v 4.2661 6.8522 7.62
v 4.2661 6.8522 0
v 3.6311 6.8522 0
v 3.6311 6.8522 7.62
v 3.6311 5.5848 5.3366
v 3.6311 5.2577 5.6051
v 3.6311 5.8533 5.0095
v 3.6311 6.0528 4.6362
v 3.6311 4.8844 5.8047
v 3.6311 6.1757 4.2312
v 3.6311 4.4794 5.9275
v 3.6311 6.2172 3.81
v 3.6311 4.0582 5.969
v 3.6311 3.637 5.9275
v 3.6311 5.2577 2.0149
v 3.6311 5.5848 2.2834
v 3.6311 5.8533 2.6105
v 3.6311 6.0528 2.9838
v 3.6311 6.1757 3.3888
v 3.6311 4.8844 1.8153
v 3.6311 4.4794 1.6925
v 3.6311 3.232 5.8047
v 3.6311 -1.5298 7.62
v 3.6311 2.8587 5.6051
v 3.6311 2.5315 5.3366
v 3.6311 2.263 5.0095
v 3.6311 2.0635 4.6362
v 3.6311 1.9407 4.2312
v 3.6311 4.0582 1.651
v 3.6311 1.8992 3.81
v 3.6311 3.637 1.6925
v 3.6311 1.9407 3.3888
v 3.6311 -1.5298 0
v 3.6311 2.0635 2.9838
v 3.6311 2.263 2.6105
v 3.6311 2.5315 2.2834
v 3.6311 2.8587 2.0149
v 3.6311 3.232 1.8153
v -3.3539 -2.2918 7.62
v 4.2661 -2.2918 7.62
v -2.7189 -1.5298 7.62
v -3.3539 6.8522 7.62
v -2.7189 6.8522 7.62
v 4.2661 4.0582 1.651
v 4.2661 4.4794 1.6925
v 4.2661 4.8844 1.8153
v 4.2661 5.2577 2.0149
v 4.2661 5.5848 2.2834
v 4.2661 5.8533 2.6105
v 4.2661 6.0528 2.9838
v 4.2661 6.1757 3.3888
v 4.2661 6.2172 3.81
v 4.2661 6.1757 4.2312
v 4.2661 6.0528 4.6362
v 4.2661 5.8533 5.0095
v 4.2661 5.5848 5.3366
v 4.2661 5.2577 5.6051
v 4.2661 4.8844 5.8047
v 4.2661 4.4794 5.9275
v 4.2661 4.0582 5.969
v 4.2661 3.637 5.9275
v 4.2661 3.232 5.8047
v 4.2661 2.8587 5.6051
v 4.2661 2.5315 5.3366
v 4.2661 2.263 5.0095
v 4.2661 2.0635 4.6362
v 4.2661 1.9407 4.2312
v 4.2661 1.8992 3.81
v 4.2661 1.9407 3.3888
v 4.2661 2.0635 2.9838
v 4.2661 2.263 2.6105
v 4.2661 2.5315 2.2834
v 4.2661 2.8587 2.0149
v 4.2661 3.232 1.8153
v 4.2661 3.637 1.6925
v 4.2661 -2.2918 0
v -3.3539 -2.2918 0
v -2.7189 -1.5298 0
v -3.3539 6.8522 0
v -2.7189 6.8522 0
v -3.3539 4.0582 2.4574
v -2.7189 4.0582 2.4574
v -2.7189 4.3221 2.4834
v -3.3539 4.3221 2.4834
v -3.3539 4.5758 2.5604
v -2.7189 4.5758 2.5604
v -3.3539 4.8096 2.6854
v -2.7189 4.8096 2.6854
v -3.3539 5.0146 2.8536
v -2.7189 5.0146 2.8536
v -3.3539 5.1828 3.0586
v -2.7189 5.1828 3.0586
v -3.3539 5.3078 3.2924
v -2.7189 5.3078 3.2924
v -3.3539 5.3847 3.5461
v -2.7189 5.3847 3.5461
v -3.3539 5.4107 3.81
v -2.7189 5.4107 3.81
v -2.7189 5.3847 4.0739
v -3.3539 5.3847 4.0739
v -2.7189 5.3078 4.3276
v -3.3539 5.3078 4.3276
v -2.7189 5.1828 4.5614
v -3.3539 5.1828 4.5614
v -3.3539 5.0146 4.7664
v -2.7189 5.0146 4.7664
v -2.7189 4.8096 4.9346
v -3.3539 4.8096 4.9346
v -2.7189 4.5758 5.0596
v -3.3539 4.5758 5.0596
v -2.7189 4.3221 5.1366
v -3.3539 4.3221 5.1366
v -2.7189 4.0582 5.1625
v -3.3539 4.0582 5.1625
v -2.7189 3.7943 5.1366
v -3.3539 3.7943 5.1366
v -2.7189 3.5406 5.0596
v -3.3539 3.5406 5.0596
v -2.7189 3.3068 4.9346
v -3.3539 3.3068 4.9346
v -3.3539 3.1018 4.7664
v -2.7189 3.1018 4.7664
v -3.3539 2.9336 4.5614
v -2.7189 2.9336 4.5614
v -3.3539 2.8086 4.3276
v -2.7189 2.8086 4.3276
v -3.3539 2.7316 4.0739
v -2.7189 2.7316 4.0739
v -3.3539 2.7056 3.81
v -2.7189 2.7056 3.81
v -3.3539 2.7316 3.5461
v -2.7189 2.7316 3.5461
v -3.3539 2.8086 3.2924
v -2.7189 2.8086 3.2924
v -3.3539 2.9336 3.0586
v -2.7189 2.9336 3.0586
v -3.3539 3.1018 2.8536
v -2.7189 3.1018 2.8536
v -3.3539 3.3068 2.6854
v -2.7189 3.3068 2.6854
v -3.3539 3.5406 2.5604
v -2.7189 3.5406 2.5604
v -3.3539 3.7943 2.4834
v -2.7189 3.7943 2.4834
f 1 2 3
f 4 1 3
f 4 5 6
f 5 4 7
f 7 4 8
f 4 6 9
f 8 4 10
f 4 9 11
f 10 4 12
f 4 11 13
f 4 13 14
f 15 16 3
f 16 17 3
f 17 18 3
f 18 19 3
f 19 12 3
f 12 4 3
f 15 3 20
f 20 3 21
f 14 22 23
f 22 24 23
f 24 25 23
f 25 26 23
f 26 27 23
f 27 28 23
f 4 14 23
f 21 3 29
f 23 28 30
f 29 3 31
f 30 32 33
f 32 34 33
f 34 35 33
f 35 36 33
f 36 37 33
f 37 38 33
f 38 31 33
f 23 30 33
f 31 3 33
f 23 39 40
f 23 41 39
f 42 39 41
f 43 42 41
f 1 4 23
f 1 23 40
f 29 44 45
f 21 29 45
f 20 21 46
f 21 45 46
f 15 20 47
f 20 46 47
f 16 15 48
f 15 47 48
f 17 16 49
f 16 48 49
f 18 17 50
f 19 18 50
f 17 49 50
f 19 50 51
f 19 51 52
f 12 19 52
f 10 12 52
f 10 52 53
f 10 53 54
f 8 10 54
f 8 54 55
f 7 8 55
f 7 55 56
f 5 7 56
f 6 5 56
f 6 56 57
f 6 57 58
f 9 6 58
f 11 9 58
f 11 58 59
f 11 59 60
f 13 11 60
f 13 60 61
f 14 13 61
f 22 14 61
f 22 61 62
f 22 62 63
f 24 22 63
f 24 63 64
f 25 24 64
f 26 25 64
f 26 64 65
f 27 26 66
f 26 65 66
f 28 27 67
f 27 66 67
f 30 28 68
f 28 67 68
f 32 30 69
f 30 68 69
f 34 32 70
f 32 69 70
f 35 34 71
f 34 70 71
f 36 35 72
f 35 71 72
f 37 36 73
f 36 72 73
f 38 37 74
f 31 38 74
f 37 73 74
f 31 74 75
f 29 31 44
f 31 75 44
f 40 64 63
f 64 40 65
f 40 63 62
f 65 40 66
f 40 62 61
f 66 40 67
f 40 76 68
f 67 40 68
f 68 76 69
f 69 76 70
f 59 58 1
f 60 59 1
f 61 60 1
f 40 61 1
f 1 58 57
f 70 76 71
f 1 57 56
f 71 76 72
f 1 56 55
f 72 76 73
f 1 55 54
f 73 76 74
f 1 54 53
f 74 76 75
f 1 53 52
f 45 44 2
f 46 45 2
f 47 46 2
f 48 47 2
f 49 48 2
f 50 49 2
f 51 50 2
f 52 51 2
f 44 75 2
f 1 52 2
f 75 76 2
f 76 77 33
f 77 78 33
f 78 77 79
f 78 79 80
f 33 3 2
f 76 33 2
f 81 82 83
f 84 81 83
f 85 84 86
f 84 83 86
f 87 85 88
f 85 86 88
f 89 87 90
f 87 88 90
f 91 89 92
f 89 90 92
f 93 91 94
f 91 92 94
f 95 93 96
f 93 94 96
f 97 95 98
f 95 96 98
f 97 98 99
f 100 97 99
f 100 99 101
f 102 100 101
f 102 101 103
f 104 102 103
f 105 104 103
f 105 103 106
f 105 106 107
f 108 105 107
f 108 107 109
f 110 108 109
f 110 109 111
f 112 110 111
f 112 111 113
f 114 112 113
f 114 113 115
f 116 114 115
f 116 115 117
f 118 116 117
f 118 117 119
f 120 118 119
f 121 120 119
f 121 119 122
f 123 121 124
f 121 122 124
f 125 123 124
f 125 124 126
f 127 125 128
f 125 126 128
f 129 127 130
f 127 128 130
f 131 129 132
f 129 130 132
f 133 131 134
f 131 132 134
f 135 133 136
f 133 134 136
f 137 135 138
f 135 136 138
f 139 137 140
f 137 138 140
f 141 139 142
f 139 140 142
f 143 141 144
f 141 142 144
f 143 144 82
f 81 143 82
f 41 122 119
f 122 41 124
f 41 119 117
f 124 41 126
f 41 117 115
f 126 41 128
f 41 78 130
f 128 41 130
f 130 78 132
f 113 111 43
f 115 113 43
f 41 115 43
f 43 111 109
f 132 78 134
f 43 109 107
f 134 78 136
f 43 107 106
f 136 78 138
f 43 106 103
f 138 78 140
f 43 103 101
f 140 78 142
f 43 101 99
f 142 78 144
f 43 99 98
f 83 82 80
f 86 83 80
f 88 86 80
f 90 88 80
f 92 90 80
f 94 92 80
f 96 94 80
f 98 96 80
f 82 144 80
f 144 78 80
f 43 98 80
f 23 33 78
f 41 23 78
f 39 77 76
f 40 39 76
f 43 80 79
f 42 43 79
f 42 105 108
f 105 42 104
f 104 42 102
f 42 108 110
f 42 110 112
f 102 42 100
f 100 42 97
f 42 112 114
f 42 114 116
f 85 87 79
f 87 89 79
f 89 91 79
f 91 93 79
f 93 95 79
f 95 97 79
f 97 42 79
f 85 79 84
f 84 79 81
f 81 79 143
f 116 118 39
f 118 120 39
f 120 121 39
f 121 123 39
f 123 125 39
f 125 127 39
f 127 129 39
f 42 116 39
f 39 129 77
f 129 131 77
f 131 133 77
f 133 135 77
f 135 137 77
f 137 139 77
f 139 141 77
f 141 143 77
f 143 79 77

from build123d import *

# Parameters (mm, degrees)
BOSS_EXTRUDE1_DEPTH       = 7.62
F_6_32_TAPPED_HOLE1_D     = 2.7051
F_6_32_TAPPED_HOLE1_DEPTH = 0.635
CUT_EXTRUDE1_REACH        = 9.62
SKETCH6_R                 = 2.159


with BuildPart() as part:
    # Sketch1 → Boss-Extrude1 (new body)
    with BuildSketch(Plane.XY):
        Polygon((-3.353873239, 6.85218662), (-3.353873239, -2.29181338), (4.266126761, -2.29181338), (4.266126761, 6.85218662), (3.631126761, 6.85218662), (3.631126761, -1.52981338), (-2.718873239, -1.52981338), (-2.718873239, 6.85218662), align=None)
    extrude(amount=BOSS_EXTRUDE1_DEPTH)

    # #6-32 Tapped Hole1
    with Locations(Plane.ZY.offset(3.353873239)):
        with Locations((3.81, 4.05818662)):
            Hole(F_6_32_TAPPED_HOLE1_D / 2, depth=F_6_32_TAPPED_HOLE1_DEPTH)

    # Sketch6 → Cut-Extrude1 (cut, up to next)
    with BuildSketch(Plane(origin=(4.266126761, 0, 0), x_dir=(0, 0, -1), z_dir=(1, 0, 0)), mode=Mode.PRIVATE) as cut_extrude1_sk1:
        with Locations((-3.81, 4.05818662)):
            Circle(SKETCH6_R)
    cut_extrude1_tool1 = extrude(cut_extrude1_sk1.sketch, amount=-CUT_EXTRUDE1_REACH, mode=Mode.PRIVATE) & part.part
    add(cut_extrude1_tool1.solids().sort_by_distance((4.266127, 4.058187, 3.81))[0], mode=Mode.SUBTRACT)


solid = part.part
